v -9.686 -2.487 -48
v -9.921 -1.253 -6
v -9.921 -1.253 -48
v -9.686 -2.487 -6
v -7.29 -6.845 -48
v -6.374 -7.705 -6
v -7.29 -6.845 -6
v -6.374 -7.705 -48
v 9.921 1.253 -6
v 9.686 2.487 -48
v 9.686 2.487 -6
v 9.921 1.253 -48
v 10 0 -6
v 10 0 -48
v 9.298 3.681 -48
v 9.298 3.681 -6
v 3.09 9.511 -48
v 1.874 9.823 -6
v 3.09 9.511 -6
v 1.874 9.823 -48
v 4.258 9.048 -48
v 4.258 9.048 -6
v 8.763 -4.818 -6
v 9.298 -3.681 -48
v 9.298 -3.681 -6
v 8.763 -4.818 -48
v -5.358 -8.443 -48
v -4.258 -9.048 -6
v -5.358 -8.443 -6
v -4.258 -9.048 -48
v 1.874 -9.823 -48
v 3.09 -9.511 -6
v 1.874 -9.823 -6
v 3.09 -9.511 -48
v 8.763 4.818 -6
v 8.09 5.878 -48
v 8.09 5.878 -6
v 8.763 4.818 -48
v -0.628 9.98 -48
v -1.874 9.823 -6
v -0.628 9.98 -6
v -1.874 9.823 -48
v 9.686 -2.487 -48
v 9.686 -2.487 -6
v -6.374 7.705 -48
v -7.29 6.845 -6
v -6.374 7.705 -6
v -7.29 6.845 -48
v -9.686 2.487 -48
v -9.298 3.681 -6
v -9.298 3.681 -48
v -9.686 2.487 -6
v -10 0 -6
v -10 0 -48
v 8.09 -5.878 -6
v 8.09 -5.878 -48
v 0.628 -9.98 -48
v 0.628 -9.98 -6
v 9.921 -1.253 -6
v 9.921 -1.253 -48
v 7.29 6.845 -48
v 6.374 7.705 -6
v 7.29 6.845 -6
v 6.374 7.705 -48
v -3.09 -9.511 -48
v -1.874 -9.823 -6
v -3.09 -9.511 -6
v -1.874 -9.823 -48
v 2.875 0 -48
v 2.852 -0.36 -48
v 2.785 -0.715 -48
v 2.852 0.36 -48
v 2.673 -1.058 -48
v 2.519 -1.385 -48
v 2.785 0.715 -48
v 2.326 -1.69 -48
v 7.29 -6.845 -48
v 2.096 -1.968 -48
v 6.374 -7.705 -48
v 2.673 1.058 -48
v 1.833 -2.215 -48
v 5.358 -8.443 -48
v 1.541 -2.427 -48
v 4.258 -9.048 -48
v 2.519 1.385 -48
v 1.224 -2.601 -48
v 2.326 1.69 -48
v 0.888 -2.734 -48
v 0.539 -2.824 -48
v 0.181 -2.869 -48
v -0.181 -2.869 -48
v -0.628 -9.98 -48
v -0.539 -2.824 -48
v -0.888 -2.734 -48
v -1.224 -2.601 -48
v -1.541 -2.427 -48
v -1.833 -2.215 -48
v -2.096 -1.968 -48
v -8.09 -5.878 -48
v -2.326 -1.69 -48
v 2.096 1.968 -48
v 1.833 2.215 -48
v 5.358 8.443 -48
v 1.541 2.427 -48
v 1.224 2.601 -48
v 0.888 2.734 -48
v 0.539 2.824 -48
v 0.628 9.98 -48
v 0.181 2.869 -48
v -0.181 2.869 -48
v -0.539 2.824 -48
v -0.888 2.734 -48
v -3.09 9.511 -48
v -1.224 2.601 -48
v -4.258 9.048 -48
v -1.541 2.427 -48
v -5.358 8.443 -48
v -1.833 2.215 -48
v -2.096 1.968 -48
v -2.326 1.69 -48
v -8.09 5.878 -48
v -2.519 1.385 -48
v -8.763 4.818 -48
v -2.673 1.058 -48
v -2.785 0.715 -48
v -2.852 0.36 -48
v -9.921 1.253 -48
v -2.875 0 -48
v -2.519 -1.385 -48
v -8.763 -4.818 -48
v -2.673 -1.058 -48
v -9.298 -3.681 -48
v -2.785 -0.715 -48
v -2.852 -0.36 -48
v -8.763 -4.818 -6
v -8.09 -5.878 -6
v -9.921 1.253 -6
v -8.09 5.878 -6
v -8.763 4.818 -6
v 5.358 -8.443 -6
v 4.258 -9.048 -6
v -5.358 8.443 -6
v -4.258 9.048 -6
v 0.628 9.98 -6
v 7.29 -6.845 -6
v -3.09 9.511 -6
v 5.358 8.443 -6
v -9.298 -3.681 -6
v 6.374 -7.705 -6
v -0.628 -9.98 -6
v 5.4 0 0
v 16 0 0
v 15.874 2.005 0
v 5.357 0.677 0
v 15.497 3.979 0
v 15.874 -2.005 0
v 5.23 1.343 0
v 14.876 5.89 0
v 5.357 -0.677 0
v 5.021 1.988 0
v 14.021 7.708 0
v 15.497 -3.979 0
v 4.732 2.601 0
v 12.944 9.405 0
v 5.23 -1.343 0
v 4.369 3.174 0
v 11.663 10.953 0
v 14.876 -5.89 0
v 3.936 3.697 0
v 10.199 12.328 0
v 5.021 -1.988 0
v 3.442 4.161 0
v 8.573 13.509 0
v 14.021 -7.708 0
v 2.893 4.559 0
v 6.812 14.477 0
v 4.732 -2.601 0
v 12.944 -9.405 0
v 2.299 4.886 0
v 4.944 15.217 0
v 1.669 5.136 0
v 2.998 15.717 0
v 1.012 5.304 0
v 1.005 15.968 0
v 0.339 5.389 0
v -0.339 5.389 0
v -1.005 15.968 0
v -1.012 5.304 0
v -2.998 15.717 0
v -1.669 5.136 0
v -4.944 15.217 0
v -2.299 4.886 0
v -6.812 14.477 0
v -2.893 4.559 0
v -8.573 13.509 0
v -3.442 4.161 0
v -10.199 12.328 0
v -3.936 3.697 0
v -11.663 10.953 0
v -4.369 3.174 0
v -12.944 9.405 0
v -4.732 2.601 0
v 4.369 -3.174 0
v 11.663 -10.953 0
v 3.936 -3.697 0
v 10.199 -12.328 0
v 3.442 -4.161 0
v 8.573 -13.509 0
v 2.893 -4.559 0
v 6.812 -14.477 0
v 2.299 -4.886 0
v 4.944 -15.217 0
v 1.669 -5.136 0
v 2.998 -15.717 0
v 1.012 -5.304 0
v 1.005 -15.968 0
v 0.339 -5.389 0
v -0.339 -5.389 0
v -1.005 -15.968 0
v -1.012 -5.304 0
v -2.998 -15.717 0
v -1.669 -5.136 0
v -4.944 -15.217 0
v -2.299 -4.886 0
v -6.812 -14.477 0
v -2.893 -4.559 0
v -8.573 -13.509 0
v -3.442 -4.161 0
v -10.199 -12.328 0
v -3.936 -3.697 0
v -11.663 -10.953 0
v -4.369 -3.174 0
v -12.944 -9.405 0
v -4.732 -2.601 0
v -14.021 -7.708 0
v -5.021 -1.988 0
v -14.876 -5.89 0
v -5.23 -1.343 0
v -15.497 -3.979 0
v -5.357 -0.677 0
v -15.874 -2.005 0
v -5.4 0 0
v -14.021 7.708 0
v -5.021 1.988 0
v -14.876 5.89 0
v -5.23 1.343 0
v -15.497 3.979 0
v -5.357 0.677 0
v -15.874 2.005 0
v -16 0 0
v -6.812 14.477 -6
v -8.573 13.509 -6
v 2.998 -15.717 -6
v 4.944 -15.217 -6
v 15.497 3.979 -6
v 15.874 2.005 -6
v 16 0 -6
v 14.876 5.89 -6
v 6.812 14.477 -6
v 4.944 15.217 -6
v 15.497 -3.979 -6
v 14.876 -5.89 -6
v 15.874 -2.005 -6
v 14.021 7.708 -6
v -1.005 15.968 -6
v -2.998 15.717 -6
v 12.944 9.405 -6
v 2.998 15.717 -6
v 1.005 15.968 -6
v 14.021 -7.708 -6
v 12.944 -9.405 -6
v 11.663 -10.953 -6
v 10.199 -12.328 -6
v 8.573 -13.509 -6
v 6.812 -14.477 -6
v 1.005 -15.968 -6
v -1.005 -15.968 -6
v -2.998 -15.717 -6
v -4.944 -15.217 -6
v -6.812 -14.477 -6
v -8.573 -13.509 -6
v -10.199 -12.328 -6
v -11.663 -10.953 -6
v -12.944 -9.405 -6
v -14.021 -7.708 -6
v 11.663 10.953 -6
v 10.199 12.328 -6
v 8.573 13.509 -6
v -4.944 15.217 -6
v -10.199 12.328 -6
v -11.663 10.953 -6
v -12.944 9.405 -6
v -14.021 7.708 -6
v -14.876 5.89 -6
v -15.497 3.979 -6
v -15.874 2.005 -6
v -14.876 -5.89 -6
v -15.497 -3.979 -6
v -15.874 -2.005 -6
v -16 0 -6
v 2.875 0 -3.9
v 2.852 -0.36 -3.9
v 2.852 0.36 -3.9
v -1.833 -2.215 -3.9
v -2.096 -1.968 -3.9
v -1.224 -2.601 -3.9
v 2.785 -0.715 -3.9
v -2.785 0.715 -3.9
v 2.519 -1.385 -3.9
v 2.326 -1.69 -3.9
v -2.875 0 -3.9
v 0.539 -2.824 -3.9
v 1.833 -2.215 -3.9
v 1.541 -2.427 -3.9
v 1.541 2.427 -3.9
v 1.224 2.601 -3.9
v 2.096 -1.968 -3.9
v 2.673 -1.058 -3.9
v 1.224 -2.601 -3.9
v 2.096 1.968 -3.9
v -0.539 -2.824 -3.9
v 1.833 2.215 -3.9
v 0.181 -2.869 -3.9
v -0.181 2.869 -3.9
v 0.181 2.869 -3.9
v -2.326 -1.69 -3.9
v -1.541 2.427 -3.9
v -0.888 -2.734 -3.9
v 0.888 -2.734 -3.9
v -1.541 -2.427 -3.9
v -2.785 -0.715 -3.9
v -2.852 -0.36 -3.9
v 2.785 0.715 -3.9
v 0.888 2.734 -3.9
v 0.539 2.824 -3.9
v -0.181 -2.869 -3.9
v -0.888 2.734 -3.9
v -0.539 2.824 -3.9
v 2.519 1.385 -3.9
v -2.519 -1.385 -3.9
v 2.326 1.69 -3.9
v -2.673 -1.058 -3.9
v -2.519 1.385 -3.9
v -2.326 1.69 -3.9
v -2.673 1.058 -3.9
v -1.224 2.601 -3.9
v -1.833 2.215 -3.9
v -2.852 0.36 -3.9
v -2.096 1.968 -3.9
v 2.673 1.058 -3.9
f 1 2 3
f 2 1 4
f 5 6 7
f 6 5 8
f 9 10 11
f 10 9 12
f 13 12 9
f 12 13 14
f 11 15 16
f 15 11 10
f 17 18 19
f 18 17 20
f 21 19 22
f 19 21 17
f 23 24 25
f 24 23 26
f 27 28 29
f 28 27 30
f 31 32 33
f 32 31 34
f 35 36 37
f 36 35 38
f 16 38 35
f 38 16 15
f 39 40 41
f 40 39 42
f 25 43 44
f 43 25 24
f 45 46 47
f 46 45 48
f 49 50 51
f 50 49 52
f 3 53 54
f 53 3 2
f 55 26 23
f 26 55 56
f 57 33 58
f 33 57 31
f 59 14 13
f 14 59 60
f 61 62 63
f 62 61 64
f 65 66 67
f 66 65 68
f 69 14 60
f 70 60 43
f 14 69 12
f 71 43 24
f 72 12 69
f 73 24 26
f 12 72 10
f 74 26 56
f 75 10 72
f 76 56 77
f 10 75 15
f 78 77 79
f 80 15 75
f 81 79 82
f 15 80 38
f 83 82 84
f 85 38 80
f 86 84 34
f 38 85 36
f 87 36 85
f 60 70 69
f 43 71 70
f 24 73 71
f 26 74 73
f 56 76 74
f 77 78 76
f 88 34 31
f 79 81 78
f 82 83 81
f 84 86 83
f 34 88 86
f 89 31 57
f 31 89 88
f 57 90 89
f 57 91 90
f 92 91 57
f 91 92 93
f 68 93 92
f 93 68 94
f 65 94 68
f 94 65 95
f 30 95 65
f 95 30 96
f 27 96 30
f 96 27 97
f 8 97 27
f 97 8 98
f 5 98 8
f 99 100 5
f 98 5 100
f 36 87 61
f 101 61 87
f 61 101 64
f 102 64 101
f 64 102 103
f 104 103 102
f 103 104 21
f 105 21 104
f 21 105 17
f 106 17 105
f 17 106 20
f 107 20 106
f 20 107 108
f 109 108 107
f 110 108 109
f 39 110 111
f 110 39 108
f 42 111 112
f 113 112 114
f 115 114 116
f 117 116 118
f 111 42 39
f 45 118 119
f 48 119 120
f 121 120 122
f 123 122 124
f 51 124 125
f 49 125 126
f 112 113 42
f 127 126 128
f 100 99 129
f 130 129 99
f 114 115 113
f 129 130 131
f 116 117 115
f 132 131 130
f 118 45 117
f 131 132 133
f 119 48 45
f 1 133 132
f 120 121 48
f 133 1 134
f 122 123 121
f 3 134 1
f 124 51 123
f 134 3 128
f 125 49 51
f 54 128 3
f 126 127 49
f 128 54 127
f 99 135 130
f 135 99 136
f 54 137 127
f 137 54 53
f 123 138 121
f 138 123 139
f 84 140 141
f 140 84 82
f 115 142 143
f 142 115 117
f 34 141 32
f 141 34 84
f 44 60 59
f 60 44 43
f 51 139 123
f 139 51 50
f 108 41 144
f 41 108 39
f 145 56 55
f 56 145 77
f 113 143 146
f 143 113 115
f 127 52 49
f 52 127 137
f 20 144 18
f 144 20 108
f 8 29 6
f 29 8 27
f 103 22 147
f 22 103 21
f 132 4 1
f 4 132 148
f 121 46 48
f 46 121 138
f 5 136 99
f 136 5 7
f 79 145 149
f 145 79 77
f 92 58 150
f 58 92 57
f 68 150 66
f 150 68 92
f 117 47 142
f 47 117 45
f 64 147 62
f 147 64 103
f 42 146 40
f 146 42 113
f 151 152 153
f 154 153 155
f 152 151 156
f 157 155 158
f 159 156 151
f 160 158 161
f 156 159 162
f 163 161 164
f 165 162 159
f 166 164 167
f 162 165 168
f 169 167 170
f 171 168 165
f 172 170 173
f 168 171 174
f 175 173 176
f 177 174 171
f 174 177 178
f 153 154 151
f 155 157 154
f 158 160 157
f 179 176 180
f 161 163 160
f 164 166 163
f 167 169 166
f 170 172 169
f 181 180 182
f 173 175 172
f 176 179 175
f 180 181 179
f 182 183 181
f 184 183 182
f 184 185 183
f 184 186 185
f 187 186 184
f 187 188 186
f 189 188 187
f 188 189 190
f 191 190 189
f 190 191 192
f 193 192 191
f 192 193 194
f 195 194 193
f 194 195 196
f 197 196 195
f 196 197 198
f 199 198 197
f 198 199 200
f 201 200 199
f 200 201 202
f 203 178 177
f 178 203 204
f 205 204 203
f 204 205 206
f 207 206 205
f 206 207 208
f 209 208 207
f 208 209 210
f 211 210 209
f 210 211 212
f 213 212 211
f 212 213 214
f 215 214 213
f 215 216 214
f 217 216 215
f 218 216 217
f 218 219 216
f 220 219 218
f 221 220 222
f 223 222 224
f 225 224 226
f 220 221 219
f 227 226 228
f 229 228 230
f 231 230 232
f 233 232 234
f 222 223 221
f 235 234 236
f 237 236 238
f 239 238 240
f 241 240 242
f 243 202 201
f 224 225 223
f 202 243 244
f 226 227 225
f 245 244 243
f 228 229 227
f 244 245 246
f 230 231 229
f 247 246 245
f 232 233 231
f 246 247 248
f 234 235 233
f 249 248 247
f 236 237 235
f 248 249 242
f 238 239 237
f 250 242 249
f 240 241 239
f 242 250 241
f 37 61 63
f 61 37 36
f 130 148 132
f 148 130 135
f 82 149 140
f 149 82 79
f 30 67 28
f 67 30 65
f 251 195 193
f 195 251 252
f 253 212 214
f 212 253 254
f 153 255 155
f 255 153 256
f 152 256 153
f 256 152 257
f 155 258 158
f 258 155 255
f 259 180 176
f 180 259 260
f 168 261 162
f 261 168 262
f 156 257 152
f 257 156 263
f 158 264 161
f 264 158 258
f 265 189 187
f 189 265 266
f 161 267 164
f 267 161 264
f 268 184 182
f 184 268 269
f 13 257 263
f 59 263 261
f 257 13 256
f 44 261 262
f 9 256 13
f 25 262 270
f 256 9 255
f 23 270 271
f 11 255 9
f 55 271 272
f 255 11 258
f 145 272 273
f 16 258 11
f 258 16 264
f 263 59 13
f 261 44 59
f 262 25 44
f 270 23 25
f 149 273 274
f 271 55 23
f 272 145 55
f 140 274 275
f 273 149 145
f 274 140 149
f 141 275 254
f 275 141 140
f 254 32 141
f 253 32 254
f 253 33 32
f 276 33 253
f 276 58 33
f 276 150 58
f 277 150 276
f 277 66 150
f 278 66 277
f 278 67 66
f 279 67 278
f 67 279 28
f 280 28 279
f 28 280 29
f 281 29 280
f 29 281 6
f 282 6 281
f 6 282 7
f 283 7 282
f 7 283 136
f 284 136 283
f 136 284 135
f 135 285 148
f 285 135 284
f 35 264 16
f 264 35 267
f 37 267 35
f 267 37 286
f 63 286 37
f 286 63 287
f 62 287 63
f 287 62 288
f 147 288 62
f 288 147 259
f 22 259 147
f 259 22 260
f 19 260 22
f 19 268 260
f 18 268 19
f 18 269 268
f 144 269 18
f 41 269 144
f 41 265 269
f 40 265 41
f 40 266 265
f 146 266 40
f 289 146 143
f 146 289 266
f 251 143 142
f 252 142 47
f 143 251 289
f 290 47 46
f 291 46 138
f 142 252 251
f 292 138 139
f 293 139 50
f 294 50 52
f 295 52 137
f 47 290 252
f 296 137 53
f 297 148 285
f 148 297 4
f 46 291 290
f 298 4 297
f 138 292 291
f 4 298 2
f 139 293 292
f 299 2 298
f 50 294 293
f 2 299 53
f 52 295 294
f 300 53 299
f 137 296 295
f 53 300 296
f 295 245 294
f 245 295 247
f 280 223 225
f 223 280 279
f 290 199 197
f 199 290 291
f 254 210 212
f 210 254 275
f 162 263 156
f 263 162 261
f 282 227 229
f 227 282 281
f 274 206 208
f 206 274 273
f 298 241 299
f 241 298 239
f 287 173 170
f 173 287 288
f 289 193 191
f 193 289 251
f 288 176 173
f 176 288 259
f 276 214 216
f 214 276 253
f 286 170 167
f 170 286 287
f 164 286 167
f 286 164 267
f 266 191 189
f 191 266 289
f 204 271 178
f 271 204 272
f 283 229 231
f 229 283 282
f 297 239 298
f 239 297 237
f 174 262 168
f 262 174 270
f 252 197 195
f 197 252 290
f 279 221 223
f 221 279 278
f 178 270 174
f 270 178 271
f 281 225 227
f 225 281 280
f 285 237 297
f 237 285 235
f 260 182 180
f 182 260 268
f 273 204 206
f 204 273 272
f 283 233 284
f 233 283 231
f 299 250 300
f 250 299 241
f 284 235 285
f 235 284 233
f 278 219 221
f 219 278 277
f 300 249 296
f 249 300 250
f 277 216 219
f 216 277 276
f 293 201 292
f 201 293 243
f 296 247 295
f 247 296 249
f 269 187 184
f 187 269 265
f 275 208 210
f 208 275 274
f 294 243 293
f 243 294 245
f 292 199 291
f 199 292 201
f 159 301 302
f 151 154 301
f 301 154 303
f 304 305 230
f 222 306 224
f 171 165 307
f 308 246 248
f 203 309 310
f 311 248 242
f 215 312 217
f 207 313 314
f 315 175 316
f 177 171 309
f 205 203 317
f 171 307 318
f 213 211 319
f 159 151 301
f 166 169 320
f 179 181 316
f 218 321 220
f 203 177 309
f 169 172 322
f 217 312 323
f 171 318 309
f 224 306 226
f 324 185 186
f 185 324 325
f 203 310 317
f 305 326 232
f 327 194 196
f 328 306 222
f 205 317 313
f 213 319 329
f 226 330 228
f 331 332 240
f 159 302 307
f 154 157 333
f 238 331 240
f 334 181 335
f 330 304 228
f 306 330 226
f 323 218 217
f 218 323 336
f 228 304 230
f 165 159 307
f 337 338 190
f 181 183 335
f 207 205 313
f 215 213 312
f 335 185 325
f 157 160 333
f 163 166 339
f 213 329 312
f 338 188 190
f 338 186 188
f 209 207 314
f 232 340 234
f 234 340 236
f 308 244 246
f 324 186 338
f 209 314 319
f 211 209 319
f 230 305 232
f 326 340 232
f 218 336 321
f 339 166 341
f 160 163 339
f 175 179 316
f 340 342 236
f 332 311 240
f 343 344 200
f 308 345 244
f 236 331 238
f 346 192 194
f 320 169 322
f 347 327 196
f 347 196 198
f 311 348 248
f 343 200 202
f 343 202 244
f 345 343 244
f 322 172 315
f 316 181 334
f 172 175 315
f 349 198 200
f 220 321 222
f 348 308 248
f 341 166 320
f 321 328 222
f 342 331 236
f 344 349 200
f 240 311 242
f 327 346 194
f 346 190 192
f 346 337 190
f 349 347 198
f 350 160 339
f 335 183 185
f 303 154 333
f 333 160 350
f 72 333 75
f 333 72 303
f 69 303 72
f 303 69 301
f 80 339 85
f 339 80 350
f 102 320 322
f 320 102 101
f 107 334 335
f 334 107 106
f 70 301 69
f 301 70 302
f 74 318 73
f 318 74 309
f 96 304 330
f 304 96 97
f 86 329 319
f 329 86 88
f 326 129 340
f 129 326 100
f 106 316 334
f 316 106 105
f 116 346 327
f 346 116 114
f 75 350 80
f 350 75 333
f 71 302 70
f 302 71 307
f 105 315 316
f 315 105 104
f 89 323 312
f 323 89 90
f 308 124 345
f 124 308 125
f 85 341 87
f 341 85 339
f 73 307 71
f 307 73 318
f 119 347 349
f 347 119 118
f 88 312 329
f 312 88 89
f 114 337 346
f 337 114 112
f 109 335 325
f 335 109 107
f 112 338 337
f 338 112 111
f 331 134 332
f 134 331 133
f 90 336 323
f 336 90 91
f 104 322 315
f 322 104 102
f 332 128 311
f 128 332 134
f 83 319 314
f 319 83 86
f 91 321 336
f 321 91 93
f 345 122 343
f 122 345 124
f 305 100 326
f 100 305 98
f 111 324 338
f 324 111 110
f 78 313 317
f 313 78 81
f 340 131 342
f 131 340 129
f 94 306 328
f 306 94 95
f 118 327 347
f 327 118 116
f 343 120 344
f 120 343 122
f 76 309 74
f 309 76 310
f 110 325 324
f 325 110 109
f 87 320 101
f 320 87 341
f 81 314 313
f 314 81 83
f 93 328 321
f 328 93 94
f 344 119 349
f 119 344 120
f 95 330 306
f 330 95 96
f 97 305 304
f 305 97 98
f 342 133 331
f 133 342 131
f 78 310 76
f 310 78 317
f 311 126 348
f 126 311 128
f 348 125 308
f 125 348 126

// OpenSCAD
$fn = 50;


difference() {
	union() {
		translate(v = [0, 0, -48.0000000000]) {
			cylinder(h = 48, r = 10.0000000000);
		}
		translate(v = [0, 0, -6.0000000000]) {
			cylinder(h = 6, r = 16.0000000000);
		}
	}
	union() {
		translate(v = [0, 0, 0]) {
			rotate(a = [0, 0, 0]) {
				difference() {
					union() {
						#translate(v = [0, 0, -48.0000000000]) {
							cylinder(h = 48, r = 2.6000000000);
						}
						#translate(v = [0, 0, -3.9000000000]) {
							cylinder(h = 3.9000000000, r = 10.0000000000, r1 = 2.8750000000, r2 = 5.4000000000);
						}
						#translate(v = [0, 0, -48.0000000000]) {
							cylinder(h = 48, r = 2.8750000000);
						}
						#translate(v = [0, 0, -48.0000000000]) {
							cylinder(h = 48, r = 2.6000000000);
						}
					}
					union();
				}
			}
		}
	}
}
